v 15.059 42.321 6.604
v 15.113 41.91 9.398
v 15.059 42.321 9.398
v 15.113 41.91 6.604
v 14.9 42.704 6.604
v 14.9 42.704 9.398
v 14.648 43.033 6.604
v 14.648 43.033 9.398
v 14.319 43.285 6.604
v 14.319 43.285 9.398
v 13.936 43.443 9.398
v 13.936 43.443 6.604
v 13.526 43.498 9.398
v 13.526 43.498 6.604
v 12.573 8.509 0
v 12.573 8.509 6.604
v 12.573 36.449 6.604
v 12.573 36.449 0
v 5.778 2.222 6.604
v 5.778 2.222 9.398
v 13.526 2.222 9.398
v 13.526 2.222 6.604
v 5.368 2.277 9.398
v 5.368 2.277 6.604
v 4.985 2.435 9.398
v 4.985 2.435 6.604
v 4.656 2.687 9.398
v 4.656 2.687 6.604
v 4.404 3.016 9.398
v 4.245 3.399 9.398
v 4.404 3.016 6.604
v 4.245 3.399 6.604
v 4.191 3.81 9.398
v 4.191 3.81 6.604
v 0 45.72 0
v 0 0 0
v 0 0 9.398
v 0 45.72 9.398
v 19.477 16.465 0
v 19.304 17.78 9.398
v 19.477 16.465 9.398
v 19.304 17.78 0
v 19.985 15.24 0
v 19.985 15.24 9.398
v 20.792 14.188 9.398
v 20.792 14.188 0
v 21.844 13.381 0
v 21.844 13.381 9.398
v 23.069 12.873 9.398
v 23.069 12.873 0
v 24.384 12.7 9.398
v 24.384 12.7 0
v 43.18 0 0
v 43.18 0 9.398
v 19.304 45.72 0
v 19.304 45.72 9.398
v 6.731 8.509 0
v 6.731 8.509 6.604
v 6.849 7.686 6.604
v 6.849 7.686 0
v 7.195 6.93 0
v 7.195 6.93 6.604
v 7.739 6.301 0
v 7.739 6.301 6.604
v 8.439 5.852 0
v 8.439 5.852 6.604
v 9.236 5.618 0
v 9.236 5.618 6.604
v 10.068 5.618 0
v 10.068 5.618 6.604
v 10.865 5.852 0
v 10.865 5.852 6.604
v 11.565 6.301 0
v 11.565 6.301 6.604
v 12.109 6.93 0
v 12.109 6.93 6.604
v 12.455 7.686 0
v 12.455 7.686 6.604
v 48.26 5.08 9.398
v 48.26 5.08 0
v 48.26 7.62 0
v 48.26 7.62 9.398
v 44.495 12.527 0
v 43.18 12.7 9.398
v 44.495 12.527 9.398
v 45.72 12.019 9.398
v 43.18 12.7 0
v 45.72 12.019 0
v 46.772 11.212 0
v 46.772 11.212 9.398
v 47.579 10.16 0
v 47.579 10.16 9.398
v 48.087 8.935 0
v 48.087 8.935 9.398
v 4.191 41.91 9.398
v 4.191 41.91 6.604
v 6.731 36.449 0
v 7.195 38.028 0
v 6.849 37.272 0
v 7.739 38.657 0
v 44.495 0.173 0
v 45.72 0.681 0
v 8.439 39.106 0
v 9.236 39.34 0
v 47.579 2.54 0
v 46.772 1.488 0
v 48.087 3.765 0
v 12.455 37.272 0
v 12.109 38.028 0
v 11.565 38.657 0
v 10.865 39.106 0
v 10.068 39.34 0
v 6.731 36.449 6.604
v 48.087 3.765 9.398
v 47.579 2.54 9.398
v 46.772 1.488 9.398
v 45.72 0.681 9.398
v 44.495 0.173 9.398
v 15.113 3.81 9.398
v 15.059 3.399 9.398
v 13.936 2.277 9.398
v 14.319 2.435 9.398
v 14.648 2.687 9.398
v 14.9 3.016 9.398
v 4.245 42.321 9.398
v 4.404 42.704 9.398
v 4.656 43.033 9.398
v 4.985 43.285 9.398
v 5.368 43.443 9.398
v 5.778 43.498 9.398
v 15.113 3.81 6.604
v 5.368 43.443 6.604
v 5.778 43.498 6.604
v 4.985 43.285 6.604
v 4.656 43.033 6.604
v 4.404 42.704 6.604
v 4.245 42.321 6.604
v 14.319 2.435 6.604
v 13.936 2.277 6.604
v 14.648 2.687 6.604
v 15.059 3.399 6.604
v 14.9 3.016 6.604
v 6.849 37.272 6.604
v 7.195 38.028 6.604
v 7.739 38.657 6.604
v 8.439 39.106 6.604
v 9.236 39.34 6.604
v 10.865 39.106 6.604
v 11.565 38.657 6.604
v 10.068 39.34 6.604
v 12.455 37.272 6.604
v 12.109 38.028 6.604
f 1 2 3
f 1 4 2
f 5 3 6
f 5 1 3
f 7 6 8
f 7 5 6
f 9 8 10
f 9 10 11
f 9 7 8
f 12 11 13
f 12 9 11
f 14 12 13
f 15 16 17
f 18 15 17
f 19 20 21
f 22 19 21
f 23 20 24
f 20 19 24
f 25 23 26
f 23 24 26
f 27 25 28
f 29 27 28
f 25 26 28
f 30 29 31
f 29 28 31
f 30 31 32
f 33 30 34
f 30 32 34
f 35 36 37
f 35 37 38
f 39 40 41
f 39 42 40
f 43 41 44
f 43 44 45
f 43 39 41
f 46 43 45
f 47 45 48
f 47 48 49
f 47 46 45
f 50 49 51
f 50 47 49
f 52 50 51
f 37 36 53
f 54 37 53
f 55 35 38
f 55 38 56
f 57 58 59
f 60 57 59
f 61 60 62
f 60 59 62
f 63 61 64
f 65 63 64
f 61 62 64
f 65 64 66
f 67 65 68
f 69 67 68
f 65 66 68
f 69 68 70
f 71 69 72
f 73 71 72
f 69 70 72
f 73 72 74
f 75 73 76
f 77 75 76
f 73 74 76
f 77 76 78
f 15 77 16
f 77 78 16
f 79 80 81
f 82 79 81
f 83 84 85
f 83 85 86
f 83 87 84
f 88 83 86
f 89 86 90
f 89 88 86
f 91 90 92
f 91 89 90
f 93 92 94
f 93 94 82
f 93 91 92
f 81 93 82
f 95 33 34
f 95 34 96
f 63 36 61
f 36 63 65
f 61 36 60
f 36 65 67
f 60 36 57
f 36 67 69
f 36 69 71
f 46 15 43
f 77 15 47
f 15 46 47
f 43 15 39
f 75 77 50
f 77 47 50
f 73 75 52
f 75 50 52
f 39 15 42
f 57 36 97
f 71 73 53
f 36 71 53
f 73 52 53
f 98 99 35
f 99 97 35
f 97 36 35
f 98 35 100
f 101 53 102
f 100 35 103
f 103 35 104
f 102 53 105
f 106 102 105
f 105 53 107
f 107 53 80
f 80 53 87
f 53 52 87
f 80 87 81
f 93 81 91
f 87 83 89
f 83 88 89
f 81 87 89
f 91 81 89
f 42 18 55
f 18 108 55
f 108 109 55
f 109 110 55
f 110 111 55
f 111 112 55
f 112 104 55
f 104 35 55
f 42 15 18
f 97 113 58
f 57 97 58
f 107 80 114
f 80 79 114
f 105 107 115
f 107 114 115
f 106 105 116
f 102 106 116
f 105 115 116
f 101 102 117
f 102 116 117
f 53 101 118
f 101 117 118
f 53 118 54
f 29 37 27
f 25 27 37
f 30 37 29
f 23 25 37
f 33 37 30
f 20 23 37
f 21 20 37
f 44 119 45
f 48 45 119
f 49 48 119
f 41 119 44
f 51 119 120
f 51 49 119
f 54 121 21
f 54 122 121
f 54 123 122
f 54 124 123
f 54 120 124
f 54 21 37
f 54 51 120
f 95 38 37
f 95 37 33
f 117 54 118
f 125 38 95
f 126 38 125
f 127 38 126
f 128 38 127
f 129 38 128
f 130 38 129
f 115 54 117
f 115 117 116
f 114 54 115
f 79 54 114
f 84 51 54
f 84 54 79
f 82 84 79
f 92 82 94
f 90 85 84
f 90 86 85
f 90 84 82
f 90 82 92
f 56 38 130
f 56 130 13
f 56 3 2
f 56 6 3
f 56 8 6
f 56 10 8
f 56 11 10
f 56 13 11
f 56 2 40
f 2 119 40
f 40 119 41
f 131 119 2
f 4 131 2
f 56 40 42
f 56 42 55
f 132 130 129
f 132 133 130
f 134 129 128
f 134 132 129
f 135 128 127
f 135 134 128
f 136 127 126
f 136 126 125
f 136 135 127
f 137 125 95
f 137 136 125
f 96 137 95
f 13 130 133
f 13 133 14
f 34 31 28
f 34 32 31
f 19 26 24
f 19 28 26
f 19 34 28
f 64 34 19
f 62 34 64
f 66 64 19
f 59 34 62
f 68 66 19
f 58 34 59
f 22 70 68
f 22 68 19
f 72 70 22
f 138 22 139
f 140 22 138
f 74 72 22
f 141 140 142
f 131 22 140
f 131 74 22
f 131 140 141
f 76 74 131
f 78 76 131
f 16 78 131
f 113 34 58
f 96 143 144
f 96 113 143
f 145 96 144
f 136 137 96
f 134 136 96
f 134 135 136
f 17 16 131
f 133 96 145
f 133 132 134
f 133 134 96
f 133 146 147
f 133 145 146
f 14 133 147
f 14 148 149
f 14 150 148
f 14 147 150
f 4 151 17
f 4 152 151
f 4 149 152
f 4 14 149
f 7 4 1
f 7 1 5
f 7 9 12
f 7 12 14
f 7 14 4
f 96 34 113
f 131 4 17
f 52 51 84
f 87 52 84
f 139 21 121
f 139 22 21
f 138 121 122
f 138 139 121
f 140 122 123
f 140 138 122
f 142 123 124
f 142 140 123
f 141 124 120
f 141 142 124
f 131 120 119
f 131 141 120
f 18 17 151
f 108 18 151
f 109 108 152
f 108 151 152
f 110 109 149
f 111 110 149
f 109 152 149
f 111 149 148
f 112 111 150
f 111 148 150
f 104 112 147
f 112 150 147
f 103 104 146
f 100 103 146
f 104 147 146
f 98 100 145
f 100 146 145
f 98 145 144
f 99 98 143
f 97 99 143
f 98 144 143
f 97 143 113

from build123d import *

# Parameters (mm, degrees)
F0_W     = 48.26
F0_H     = 45.72
F1_DEPTH = 9.398
F2_W     = 28.956
F2_H     = 33.02
F3_DEPTH = 25.4
F4_W     = 10.922
F4_H     = 41.275
F5_DEPTH = 2.794
F7_DEPTH = 6.605
F8_R     = 5.08
F9_R     = 1.5875
F10_R    = 5.08


with BuildPart() as f1:
    # F0 (on Top) → F1 (new body)
    with BuildSketch(Plane.XY):
        with Locations((24.13, 22.86)):
            Rectangle(F0_W, F0_H)
    extrude(amount=F1_DEPTH)

    # F2 (on face) → F3 (cut)
    with BuildSketch(Plane.XY.offset(9.398)):
        with Locations((33.782, 29.21)):
            Rectangle(F2_W, F2_H)
    extrude(amount=-F3_DEPTH, mode=Mode.SUBTRACT)

    # F4 (on face) → F5 (cut)
    with BuildSketch(Plane.XY.offset(9.398)):
        with Locations((9.652, 22.86)):
            Rectangle(F4_W, F4_H)
    extrude(amount=-F5_DEPTH, mode=Mode.SUBTRACT)

    # F6 (on face) → F7 (cut, through all)
    with BuildSketch(Plane.XY.offset(6.604)):
        with BuildLine():
            ThreePointArc((12.573, 36.449), (9.652, 39.37), (6.731, 36.449))
            Line((6.731, 36.449), (6.731, 8.509))
            ThreePointArc((6.731, 8.509), (9.652, 5.588), (12.573, 8.509))
            Line((12.573, 8.509), (12.573, 36.449))
        make_face()
    extrude(amount=-F7_DEPTH, mode=Mode.SUBTRACT)

    # F8
    f8_edges = [f1.edges().sort_by_distance(p)[0] for p in [
        (19.304, 12.7, 4.699),
    ]]
    fillet(f8_edges, radius=F8_R)

    # F9
    f9_edges = [f1.edges().sort_by_distance(p)[0] for p in [
        (4.191, 43.4975, 8.001),
        (4.191, 2.2225, 8.001),
        (15.113, 2.2225, 8.001),
        (15.113, 43.4975, 8.001),
    ]]
    fillet(f9_edges, radius=F9_R)

    # F10
    f10_edges = [f1.edges().sort_by_distance(p)[0] for p in [
        (48.26, 0, 4.699),
        (48.26, 12.7, 4.699),
    ]]
    fillet(f10_edges, radius=F10_R)


solid = f1.part
